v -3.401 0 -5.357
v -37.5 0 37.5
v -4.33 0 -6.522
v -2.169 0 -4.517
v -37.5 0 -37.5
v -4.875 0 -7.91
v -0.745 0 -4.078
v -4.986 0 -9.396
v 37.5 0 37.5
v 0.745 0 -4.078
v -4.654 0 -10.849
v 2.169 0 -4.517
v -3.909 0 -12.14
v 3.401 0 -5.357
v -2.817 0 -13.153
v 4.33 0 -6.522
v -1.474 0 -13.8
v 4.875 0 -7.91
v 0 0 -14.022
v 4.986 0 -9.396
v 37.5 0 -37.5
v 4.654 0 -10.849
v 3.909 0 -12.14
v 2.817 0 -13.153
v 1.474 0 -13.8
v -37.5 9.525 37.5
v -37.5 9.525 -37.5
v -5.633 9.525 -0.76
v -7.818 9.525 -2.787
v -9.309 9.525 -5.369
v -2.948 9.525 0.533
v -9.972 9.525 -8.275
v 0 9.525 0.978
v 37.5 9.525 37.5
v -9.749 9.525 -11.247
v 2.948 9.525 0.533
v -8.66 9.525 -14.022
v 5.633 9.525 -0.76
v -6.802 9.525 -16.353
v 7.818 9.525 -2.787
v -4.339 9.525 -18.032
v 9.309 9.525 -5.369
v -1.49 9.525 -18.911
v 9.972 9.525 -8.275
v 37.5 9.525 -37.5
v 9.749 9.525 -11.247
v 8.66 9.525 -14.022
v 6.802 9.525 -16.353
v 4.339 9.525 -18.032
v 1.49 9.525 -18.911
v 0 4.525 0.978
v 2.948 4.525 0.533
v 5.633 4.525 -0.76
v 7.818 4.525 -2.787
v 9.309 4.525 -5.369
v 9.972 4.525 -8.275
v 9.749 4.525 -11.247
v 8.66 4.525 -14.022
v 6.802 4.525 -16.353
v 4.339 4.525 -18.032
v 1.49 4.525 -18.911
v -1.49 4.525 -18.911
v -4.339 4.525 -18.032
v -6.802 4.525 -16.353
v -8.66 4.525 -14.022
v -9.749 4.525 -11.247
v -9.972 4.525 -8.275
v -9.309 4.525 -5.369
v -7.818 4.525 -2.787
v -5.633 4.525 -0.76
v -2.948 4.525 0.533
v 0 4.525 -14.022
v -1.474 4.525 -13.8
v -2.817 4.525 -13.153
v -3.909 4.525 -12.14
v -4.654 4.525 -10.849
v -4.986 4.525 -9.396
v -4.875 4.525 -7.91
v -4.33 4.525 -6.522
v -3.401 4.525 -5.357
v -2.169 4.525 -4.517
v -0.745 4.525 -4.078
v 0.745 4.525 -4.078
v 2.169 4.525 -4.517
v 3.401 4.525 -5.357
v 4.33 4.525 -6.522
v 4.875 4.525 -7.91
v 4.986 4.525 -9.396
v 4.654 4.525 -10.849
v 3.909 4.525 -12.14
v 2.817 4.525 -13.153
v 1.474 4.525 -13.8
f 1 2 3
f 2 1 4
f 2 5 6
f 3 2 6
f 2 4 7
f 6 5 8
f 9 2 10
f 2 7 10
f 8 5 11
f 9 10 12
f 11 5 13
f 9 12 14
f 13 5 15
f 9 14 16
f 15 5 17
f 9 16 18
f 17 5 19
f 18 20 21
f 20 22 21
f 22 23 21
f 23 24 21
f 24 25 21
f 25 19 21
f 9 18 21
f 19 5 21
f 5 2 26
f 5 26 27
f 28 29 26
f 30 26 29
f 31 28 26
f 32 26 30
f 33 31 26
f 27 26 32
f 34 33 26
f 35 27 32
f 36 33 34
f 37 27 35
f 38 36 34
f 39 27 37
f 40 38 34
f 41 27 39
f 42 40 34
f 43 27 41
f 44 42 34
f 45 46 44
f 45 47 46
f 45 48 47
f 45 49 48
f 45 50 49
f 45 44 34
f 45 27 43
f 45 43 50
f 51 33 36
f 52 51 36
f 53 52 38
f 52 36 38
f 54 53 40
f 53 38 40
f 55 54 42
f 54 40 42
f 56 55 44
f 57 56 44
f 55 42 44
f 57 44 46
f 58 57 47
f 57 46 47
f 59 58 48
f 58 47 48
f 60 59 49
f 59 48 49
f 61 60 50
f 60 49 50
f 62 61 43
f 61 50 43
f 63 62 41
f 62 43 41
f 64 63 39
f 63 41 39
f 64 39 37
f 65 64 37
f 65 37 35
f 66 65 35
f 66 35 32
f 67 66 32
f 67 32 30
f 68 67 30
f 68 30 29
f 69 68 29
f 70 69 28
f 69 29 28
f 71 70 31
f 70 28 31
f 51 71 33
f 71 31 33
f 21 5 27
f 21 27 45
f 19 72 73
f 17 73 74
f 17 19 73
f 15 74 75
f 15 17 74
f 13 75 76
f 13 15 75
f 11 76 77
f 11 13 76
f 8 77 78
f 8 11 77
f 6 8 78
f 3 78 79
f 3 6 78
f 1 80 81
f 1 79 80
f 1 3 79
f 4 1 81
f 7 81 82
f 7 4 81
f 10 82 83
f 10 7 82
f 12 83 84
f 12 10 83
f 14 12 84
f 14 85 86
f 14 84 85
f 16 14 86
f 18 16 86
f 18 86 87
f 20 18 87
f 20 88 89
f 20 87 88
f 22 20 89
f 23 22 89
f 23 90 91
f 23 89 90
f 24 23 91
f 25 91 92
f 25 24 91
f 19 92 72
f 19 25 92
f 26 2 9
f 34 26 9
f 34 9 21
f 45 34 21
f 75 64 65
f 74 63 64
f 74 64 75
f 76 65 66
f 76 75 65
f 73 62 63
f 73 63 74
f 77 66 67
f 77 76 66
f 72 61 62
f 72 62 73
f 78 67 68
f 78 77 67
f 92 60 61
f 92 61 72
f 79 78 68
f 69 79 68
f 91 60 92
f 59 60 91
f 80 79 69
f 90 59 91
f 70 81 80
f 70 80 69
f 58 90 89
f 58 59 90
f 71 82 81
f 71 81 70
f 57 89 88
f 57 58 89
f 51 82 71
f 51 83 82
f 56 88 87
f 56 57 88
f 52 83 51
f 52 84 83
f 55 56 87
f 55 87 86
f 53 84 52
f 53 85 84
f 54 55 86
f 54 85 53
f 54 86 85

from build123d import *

# Parameters (mm, degrees)
CROQUIS1_W              = 75
CROQUIS1_H              = 75
CROQUIS1_R              = 5
SALIENTE_EXTRUIR1_DEPTH = 9.525
CROQUIS2_R              = 10
CORTAR_EXTRUIR1_DEPTH   = 5


with BuildPart() as part:
    # Croquis1 → Saliente-Extruir1 (new body)
    with BuildSketch(Plane(origin=(0, 0, 0), x_dir=(1, 0, 0), z_dir=(0, 1, 0))):
        Rectangle(CROQUIS1_W, CROQUIS1_H)
        with Locations(Location((0, 9.022258823, 0), (0, 0, 90))):
            Circle(CROQUIS1_R, mode=Mode.SUBTRACT)
    extrude(amount=SALIENTE_EXTRUIR1_DEPTH)

    # Croquis2 → Cortar-Extruir1 (cut)
    with BuildSketch(Plane(origin=(0, 9.525, 0), x_dir=(1, 0, 0), z_dir=(0, 1, 0))):
        with Locations(Location((0, 9.022258823, 0), (0, 0, 270))):
            Circle(CROQUIS2_R)
    extrude(amount=-CORTAR_EXTRUIR1_DEPTH, mode=Mode.SUBTRACT)


solid = part.part
